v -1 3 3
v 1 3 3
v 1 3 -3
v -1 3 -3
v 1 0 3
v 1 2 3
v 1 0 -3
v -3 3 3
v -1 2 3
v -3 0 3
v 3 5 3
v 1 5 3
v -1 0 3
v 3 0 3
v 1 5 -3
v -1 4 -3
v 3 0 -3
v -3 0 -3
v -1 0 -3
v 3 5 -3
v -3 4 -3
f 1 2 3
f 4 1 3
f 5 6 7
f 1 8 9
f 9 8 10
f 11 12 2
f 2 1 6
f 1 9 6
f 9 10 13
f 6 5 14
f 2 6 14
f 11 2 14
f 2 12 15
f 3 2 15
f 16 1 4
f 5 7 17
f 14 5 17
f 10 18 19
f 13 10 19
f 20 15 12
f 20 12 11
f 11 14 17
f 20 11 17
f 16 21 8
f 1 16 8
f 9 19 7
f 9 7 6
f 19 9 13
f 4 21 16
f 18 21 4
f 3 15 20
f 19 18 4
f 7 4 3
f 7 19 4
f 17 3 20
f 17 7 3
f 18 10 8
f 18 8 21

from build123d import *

# Parameters (mm, degrees)
SKETCH1_W           = 6
SKETCH1_H           = 6
BOSS_EXTRUDE1_DEPTH = 5
SKETCH2_W           = 6
SKETCH2_H           = 2
CUT_EXTRUDE1_DEPTH  = 1
CUT_EXTRUDE2_DEPTH  = 2


with BuildPart() as part:
    # Sketch1 → Boss-Extrude1 (new body)
    with BuildSketch(Plane(origin=(0, 0, 0), x_dir=(1, 0, 0), z_dir=(0, 1, 0))):
        Rectangle(SKETCH1_W, SKETCH1_H)
    extrude(amount=BOSS_EXTRUDE1_DEPTH)

    # Sketch2 → Cut-Extrude1 (cut, symmetric)
    with BuildSketch(Plane(origin=(0, 0, 0), x_dir=(0, 0, -1), z_dir=(1, 0, 0))):
        Polygon((3, 0), (-3, 2), (-3, 0), align=None)
        with Locations((0, 4)):
            Rectangle(SKETCH2_W, SKETCH2_H)
    extrude(amount=CUT_EXTRUDE1_DEPTH, both=True, mode=Mode.SUBTRACT)

    # Sketch3 → Cut-Extrude2 (cut)
    with BuildSketch(Plane.ZY.offset(3)):
        Polygon((-3, 4), (3, 3), (3, 5), (-3, 5), align=None)
    extrude(amount=-CUT_EXTRUDE2_DEPTH, mode=Mode.SUBTRACT)


solid = part.part
